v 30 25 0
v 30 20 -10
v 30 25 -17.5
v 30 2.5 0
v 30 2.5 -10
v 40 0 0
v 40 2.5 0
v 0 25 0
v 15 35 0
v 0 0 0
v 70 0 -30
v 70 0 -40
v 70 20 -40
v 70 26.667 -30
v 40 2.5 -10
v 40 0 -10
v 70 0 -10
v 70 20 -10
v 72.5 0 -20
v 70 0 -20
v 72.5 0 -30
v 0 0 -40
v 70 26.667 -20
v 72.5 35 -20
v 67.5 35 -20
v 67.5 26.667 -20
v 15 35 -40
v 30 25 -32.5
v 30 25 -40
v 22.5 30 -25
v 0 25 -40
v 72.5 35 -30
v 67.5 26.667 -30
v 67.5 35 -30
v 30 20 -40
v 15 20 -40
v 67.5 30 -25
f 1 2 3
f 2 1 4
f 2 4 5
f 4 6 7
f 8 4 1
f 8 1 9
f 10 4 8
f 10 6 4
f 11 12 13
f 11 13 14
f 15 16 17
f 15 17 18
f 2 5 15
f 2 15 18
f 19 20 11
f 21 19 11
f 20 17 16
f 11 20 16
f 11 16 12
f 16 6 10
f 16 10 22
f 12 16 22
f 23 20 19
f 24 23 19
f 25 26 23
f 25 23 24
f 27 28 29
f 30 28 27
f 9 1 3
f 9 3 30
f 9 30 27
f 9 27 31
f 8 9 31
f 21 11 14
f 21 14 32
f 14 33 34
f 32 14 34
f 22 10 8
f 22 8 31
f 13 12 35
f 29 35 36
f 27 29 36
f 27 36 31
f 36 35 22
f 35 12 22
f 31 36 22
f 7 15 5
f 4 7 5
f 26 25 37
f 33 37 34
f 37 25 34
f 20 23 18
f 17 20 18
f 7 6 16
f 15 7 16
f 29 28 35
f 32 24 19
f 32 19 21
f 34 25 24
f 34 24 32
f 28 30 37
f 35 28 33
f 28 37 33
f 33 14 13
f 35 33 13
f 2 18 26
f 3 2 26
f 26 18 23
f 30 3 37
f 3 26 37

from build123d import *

# Parameters (mm, degrees)
SKETCH1_W                = 30
SKETCH1_H                = 40
BOSS_EXTRUDE1_DEPTH      = 25
BOSS_EXTRUDE2_DEPTH      = 40
SKETCH3_W                = 10
SKETCH3_H                = 40
BOSS_EXTRUDE3_DEPTH      = 2.5
SKETCH4_W                = 30
SKETCH4_H                = 20
BOSS_EXTRUDE4_DEPTH      = 40
BOSS_EXTRUDE5_DEPTH      = 55
SKETCH6_W                = 10
SKETCH6_H                = 35
BOSS_EXTRUDE7_DEPTH      = 2.5
BOSS_EXTRUDE7_DEPTH_BACK = 2.5


with BuildPart() as part:
    # Sketch1 → Boss-Extrude1 (new body)
    with BuildSketch(Plane(origin=(0, 0, 0), x_dir=(1, 0, 0), z_dir=(0, 1, 0))):
        with Locations((15, 20)):
            Rectangle(SKETCH1_W, SKETCH1_H)
    extrude(amount=BOSS_EXTRUDE1_DEPTH)

    # Sketch2 → Boss-Extrude2 (add)
    with BuildSketch(Plane.XY):
        Polygon((15, 25), (30, 25), (15, 35), (0, 25), align=None)
    extrude(amount=-BOSS_EXTRUDE2_DEPTH)

    # Sketch3 → Boss-Extrude3 (add)
    with BuildSketch(Plane(origin=(0, 0, 0), x_dir=(-1, 0, 0), z_dir=(0, -1, 0))):
        with Locations((-35, 20)):
            Rectangle(SKETCH3_W, SKETCH3_H)
    extrude(amount=-BOSS_EXTRUDE3_DEPTH)

    # Sketch4 → Boss-Extrude4 (add)
    with BuildSketch(Plane(origin=(30, 0, 0), x_dir=(0, 0, -1), z_dir=(1, 0, 0))):
        with Locations((25, 10)):
            Rectangle(SKETCH4_W, SKETCH4_H)
    extrude(amount=BOSS_EXTRUDE4_DEPTH)

    # Sketch5 → Boss-Extrude5 (add)
    with BuildSketch(Plane(origin=(70, 0, 0), x_dir=(0, 0, -1), z_dir=(1, 0, 0))):
        Polygon((25, 20), (10, 20), (25, 30), (40, 20), align=None)
    extrude(amount=-BOSS_EXTRUDE5_DEPTH)

    # Sketch6 → Boss-Extrude7 (add, two sides)
    with BuildSketch(Plane(origin=(70, 0, 0), x_dir=(0, 0, -1), z_dir=(1, 0, 0))) as boss_extrude7_sk:
        with Locations((25, 17.5)):
            Rectangle(SKETCH6_W, SKETCH6_H)
    extrude(amount=BOSS_EXTRUDE7_DEPTH)
    extrude(boss_extrude7_sk.sketch, amount=-BOSS_EXTRUDE7_DEPTH_BACK)


solid = part.part
